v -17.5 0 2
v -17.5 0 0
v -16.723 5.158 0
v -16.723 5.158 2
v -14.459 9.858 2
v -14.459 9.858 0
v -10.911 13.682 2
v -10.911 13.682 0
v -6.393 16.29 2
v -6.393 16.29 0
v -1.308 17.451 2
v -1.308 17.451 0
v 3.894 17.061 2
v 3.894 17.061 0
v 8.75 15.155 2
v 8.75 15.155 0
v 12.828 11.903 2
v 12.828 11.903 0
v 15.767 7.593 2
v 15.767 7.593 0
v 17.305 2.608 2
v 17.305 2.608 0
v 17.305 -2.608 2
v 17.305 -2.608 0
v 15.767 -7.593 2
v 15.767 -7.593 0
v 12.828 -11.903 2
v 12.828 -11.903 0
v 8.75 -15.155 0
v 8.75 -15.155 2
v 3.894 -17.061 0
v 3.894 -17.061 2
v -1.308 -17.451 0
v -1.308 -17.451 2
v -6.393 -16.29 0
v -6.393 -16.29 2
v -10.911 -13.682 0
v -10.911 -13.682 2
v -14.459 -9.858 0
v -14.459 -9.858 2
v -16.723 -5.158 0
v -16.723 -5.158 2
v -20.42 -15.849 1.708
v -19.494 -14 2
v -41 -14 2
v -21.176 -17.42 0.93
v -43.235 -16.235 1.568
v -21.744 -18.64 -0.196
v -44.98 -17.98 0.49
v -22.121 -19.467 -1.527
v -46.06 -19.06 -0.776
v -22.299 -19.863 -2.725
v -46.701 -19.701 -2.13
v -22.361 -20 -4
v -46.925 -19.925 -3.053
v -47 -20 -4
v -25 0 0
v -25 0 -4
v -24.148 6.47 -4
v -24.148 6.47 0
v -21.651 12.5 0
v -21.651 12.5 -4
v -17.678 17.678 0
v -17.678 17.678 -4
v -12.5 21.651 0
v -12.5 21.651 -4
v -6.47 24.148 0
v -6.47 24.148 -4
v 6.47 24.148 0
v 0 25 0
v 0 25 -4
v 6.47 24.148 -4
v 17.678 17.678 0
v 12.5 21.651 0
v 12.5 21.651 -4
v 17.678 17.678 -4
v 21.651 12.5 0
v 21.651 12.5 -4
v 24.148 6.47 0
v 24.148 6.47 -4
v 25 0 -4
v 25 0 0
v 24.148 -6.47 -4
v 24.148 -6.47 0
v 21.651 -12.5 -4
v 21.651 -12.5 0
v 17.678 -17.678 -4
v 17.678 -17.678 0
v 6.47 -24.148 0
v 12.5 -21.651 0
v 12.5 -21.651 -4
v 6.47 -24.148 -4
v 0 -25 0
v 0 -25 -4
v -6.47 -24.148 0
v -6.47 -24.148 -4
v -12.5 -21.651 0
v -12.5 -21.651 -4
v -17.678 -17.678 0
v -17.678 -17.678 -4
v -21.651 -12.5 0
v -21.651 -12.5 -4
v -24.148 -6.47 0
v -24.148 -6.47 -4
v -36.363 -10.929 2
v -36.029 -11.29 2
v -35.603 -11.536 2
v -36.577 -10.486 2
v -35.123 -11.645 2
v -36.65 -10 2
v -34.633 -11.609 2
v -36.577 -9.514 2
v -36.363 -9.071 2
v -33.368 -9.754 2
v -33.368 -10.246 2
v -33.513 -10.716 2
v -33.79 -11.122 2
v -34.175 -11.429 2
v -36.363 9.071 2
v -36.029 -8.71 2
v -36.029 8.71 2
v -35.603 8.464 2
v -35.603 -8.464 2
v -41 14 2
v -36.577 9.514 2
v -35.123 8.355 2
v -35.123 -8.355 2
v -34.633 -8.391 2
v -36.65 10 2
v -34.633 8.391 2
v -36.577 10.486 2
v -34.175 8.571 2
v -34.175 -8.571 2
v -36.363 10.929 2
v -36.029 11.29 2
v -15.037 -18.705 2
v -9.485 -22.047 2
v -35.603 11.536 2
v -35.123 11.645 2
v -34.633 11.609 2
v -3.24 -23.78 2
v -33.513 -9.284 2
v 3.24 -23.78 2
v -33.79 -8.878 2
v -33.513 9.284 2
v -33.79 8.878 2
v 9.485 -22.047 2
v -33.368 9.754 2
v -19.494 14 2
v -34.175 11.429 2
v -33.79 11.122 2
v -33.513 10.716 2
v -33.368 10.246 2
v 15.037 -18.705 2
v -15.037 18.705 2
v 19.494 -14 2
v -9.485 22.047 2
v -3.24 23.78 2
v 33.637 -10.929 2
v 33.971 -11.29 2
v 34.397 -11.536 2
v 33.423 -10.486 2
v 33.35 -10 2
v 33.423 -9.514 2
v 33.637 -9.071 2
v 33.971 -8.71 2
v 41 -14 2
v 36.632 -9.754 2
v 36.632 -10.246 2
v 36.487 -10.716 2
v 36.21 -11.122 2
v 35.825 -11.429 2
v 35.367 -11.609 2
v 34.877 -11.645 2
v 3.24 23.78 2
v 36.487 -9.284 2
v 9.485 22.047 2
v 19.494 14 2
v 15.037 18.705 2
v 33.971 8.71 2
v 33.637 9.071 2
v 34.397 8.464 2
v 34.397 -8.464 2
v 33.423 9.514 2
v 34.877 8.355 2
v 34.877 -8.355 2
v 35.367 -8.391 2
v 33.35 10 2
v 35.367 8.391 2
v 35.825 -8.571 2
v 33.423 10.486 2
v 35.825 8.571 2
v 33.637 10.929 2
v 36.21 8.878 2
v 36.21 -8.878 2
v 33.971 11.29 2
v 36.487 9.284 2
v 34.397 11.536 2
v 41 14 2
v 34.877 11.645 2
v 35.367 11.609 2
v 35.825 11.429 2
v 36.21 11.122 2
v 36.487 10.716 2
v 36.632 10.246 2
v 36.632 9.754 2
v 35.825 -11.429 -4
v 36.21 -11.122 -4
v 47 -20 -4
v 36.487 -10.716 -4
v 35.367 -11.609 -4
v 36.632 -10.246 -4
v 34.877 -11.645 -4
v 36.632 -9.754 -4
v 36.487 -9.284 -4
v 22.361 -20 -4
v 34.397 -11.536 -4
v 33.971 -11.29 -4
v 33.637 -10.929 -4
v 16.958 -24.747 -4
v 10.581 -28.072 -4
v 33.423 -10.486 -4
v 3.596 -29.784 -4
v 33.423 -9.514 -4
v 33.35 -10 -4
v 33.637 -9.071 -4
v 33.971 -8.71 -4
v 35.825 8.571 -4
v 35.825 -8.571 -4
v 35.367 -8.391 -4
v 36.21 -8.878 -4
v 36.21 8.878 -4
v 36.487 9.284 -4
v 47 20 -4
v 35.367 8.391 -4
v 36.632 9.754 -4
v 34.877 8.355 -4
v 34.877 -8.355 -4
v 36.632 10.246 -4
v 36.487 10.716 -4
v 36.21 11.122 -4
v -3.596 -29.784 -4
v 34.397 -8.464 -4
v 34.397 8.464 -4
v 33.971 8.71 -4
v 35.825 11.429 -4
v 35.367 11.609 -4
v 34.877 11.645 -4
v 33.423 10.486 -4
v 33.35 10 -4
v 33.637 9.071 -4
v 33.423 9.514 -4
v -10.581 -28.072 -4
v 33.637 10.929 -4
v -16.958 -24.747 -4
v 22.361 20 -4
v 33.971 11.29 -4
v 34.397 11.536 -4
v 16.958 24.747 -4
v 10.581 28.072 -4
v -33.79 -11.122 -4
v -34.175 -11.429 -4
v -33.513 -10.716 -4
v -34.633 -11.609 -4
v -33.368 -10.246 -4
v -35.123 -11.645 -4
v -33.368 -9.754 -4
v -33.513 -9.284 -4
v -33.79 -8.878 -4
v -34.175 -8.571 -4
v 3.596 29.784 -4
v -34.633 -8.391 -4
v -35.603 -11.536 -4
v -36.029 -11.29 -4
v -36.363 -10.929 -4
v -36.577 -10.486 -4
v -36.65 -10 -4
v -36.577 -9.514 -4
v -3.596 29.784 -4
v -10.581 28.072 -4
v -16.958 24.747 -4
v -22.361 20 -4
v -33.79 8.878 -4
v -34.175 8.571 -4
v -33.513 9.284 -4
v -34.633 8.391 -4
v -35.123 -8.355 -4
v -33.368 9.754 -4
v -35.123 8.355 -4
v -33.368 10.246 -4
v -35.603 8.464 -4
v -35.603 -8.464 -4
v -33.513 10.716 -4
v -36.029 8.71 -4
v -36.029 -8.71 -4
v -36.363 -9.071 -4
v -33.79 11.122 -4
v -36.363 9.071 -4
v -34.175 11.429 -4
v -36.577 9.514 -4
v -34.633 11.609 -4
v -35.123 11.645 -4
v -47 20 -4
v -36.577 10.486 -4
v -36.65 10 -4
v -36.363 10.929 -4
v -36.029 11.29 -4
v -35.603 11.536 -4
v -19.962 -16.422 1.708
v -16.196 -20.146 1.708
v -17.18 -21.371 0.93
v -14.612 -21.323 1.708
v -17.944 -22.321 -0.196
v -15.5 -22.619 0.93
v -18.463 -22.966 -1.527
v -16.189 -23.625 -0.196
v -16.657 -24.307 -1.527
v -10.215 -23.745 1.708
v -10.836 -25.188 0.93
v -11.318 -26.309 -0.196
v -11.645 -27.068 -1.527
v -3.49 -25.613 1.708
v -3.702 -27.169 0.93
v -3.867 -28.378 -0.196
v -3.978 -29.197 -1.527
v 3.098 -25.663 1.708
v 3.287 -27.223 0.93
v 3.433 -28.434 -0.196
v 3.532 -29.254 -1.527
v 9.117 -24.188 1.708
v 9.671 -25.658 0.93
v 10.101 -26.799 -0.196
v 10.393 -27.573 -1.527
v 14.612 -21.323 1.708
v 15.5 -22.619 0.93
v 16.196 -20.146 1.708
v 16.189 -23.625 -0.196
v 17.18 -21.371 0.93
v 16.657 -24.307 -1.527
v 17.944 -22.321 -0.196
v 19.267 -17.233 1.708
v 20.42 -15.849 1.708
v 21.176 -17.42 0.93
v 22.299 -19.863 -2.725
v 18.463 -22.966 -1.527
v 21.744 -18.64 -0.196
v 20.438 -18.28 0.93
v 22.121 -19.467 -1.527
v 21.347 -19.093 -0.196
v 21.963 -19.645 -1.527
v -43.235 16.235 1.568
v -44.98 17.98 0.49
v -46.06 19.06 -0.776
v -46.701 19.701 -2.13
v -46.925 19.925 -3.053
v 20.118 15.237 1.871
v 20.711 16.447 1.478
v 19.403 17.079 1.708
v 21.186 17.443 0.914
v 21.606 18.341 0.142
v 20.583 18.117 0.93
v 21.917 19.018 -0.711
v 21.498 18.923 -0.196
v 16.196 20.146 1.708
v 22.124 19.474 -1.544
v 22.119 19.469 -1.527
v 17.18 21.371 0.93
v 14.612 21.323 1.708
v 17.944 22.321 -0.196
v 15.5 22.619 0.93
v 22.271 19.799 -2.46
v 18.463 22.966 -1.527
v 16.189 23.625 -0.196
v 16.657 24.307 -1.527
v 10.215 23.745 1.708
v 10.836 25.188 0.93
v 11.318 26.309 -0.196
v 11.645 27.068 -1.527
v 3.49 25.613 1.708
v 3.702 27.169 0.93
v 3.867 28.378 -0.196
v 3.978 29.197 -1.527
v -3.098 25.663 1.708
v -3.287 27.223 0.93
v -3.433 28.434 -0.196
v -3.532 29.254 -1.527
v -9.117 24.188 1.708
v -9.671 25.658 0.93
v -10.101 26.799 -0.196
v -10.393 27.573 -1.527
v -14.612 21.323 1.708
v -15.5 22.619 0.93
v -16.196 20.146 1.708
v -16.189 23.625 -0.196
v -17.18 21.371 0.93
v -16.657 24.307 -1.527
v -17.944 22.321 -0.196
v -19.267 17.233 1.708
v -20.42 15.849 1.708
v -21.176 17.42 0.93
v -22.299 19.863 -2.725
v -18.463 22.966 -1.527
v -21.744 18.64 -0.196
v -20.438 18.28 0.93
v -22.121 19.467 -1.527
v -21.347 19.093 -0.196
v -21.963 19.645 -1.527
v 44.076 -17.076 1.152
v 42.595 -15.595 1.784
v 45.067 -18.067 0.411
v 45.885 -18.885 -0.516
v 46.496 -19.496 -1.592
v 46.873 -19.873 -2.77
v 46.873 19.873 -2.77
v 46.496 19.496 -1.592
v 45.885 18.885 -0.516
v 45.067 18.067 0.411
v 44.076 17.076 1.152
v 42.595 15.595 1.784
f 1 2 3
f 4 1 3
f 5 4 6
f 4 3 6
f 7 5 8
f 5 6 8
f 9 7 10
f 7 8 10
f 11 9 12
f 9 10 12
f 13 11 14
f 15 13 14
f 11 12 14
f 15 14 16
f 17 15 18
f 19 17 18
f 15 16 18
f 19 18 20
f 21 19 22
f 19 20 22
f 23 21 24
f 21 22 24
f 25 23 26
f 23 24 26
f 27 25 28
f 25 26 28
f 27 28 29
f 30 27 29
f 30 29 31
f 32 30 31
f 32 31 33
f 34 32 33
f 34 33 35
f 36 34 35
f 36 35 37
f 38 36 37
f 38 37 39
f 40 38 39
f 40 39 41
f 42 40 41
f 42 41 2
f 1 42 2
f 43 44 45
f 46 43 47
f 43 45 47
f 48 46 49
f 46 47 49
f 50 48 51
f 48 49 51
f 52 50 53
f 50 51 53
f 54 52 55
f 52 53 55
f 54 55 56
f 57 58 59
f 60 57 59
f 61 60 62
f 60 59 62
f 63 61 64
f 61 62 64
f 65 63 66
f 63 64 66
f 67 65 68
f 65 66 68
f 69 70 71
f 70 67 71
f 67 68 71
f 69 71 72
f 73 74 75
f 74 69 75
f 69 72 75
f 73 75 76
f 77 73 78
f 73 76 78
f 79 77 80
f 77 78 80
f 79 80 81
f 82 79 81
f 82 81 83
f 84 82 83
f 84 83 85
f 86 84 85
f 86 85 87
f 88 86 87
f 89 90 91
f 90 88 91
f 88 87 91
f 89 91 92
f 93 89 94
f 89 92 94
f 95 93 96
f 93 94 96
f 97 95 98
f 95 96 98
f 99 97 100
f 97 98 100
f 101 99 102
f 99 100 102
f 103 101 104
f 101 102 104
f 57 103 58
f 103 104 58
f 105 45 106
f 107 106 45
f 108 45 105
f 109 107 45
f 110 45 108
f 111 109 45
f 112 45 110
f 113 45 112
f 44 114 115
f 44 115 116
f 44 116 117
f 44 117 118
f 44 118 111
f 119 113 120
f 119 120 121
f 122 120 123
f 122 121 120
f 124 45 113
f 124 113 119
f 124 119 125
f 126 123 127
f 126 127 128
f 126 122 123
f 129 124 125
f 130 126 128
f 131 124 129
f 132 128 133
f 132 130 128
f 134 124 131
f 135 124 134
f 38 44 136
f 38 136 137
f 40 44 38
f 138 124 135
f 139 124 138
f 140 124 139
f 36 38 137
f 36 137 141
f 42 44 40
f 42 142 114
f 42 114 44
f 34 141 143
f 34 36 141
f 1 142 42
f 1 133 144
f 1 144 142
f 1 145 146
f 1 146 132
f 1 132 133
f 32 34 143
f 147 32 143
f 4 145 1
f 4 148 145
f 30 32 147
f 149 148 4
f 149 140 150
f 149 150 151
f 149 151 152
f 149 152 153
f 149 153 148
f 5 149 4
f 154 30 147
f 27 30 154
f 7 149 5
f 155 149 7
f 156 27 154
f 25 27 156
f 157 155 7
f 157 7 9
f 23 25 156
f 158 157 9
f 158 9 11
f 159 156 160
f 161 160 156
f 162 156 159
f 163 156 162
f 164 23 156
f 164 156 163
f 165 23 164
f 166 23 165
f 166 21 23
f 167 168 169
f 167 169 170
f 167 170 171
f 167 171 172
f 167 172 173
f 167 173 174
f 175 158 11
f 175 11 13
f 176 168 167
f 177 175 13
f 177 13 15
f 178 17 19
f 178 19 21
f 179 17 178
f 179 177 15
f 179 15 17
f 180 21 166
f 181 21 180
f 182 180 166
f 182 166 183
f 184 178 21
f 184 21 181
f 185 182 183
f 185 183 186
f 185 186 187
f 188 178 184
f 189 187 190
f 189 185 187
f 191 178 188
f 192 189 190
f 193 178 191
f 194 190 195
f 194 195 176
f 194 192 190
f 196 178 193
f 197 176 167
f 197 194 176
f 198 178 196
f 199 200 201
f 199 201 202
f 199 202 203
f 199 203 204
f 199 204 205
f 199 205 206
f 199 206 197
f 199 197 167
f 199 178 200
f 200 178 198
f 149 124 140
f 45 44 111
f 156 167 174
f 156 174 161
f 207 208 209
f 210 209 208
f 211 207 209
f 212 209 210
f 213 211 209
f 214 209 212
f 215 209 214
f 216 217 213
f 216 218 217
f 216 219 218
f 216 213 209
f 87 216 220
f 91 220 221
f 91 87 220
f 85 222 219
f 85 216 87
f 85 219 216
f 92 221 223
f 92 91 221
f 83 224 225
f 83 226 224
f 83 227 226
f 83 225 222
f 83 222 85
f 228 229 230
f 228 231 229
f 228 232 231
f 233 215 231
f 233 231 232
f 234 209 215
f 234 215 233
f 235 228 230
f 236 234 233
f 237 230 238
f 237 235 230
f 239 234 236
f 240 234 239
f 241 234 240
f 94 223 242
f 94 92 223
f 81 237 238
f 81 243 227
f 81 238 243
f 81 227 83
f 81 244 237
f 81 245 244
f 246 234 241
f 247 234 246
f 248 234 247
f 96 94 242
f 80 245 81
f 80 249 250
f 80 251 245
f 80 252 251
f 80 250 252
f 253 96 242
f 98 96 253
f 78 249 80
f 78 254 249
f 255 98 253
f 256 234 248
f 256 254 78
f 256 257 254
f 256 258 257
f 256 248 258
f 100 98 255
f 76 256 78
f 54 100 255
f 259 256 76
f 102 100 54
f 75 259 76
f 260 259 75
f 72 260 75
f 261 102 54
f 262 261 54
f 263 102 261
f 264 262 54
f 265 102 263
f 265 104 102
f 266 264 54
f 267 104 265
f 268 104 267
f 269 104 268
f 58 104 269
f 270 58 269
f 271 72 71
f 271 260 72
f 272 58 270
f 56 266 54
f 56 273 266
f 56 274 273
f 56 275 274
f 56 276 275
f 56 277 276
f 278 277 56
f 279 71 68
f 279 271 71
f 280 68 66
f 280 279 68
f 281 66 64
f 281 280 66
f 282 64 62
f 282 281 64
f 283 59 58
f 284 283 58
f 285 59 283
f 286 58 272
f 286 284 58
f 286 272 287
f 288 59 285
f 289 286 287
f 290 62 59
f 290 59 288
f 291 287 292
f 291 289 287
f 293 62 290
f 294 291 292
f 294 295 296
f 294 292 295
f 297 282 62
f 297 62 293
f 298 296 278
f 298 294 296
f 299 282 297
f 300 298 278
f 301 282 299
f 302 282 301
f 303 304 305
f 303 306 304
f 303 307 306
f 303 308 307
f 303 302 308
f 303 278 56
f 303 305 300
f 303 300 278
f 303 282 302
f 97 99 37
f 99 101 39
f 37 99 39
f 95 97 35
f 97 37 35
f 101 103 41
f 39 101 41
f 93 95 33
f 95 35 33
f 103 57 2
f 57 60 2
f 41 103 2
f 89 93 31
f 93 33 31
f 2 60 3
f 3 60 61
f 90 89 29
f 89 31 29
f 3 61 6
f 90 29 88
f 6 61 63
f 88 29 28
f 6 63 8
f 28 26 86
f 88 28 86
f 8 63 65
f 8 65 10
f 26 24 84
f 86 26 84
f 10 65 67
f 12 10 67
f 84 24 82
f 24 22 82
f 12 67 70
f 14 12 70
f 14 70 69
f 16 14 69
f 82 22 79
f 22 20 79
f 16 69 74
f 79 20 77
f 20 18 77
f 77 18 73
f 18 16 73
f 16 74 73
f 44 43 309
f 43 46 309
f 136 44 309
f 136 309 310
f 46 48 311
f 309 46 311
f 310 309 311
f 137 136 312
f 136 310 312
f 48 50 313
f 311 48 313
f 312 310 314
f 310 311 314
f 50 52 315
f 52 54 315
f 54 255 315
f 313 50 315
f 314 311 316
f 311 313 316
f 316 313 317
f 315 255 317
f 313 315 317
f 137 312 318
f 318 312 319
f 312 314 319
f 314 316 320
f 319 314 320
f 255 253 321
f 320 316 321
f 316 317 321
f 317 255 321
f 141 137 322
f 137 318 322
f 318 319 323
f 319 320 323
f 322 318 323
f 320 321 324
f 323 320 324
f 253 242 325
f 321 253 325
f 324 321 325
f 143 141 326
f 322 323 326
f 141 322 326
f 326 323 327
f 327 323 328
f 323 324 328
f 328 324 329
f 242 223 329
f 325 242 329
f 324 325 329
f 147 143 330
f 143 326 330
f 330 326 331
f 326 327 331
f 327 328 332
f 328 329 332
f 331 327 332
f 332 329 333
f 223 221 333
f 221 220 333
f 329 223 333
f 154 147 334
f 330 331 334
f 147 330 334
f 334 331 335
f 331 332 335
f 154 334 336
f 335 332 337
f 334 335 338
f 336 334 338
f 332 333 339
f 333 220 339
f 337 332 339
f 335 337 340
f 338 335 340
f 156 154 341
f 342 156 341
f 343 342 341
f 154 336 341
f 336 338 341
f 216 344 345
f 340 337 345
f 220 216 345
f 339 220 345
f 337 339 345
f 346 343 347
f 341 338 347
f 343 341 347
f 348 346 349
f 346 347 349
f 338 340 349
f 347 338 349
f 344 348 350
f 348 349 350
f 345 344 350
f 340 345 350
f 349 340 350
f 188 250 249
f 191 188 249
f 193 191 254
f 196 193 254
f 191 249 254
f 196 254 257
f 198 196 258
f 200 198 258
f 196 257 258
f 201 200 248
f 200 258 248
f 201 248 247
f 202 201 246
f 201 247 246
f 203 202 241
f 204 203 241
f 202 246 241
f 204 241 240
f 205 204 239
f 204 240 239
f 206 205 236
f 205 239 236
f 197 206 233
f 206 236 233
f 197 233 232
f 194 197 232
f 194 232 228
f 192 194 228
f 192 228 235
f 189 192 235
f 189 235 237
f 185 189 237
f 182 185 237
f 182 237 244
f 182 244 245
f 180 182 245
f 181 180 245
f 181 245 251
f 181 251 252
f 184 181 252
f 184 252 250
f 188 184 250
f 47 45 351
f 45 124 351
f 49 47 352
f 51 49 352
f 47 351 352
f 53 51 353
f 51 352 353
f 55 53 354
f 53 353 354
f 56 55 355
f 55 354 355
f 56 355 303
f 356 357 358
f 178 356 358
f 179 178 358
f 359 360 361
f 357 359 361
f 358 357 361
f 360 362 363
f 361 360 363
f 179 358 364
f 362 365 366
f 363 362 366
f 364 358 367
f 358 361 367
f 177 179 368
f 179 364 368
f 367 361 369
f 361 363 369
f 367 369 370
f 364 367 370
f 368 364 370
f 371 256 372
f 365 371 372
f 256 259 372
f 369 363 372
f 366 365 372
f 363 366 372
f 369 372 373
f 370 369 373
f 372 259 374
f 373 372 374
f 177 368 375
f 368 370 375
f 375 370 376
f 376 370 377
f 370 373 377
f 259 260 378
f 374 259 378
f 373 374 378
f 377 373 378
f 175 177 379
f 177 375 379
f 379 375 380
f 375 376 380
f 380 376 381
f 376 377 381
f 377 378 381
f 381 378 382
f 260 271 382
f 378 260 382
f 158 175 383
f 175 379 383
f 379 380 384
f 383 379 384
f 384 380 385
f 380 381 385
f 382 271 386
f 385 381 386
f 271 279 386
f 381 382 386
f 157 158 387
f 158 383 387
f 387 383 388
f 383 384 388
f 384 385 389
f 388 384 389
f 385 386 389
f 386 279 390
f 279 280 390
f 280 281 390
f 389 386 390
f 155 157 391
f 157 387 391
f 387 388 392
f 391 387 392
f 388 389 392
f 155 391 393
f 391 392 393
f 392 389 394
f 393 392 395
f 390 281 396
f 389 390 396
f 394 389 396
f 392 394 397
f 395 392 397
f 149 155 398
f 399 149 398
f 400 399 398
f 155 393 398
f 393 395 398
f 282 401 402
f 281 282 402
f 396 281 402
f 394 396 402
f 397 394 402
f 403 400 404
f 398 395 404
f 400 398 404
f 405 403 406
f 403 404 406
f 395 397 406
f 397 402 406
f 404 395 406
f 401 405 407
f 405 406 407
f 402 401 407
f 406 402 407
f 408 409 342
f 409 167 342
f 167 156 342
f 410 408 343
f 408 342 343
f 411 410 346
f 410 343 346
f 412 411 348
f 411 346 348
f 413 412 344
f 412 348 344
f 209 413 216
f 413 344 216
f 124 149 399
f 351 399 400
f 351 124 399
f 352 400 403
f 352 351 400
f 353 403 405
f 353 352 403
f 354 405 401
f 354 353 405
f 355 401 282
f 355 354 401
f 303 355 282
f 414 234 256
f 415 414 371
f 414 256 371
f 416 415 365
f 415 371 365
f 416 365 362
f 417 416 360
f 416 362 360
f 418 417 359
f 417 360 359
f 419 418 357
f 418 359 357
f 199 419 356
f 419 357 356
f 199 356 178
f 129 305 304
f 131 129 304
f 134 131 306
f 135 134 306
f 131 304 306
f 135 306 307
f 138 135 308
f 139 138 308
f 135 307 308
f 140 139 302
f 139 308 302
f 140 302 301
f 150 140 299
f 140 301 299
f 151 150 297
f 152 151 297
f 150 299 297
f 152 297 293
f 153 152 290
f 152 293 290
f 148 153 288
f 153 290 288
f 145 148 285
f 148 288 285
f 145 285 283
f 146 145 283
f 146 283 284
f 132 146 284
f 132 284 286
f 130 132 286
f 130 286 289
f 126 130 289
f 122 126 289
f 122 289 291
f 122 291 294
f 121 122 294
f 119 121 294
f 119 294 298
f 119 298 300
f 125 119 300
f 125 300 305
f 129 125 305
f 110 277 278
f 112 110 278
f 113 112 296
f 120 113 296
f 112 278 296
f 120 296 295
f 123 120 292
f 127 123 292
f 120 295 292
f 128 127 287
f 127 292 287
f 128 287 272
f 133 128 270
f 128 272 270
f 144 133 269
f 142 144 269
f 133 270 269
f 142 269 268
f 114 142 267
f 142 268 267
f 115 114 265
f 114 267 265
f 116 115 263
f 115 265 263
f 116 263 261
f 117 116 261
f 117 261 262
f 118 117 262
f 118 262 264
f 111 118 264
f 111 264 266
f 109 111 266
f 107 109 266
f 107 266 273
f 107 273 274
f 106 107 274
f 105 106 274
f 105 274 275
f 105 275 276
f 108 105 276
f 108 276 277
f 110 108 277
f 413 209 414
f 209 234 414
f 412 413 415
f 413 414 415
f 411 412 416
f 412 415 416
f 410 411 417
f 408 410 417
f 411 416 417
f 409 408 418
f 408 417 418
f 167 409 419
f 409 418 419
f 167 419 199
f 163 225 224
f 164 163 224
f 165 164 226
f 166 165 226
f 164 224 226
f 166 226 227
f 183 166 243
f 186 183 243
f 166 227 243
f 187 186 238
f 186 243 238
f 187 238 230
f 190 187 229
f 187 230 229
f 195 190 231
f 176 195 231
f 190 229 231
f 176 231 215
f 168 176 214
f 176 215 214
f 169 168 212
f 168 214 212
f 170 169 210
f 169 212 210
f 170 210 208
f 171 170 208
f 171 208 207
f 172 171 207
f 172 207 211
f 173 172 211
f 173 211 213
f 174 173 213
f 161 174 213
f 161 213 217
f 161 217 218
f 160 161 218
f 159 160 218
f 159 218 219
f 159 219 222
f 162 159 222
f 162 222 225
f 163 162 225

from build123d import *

# Parameters (mm, degrees)
SKETCH1_R             = 30
BOSS_EXTRUDE1_DEPTH   = 2
BOSS_EXTRUDE2_START   = 4
SKETCH2_R             = 30
SKETCH2_R_2           = 25
BOSS_EXTRUDE2_DEPTH   = 4
BOSS_EXTRUDE3_REACH   = 44.849
SKETCH3_W             = 94
SKETCH3_H             = 40
SKETCH4_R             = 25
CUT_EXTRUDE1_DEPTH    = 4
SKETCH5_R             = 17.5
CUT_EXTRUDE2_DEPTH    = 56.901699437
FILLET1_R             = 6
M4X0_7_TAPPED_HOLE1_D = 3.3


with BuildPart() as part:
    # Sketch1 → Boss-Extrude1 (new body)
    with BuildSketch(Plane.XY):
        Circle(SKETCH1_R)
    extrude(amount=BOSS_EXTRUDE1_DEPTH)

    # Sketch2 → Boss-Extrude2 (add)
    with BuildSketch(Plane(origin=(0, 0, 0), x_dir=(-1, 0, 0), z_dir=(0, 0, -1)).offset(BOSS_EXTRUDE2_START)):
        Circle(SKETCH2_R)
        Circle(SKETCH2_R_2, mode=Mode.SUBTRACT)
    extrude(amount=-BOSS_EXTRUDE2_DEPTH)

    # Boss-Extrude3: up to this face of the body (flat: up to its plane)
    boss_extrude3_end = Plane(part.part.faces().sort_by_distance((0, 0, 2))[0])
    # Sketch3 → Boss-Extrude3 (add, up to the picked face)
    with BuildSketch(Plane(origin=(0, 0, -4), x_dir=(-1, 0, 0), z_dir=(0, 0, -1)), mode=Mode.PRIVATE) as boss_extrude3_sk1:
        Rectangle(SKETCH3_W, SKETCH3_H)
    boss_extrude3_tool1 = split(extrude(boss_extrude3_sk1.sketch, amount=-BOSS_EXTRUDE3_REACH, mode=Mode.PRIVATE), bisect_by=boss_extrude3_end, keep=Keep.BOTH, mode=Mode.PRIVATE)
    add(boss_extrude3_tool1.solids().sort_by(Axis((0, 0, -4), (0, 0, 1)))[0])

    # Sketch4 → Cut-Extrude1 (cut)
    with BuildSketch(Plane(origin=(0, 0, -4), x_dir=(-1, 0, 0), z_dir=(0, 0, -1))):
        Circle(SKETCH4_R)
    extrude(amount=-CUT_EXTRUDE1_DEPTH, mode=Mode.SUBTRACT)

    # Sketch5 → Cut-Extrude2 (cut, through all)
    with BuildSketch(Plane(origin=(0, 0, 0), x_dir=(-1, 0, 0), z_dir=(0, 0, -1))):
        Circle(SKETCH5_R)
    extrude(amount=-CUT_EXTRUDE2_DEPTH, mode=Mode.SUBTRACT)

    # Fillet1
    fillet1_edges = [part.edges().sort_by_distance(p)[0] for p in [
        (47, 0, 2),
        (34.680339887, -20, 2),
        (34.680339887, 20, 2),
        (0, 30, 2),
        (0, -30, 2),
        (-34.680339887, -20, 2),
        (-47, 0, 2),
        (-34.680339887, 20, 2),
    ]]
    fillet(fillet1_edges, radius=FILLET1_R - 0.0001)  # a hair under: the kernel refuses the full size

    # M4x0.7 Tapped Hole1 (through all)
    with Locations(Plane.XY.offset(2)):
        with Locations((-35, 10), (-35, -10), (35, 10), (35, -10)):
            Hole(M4X0_7_TAPPED_HOLE1_D / 2)


solid = part.part
